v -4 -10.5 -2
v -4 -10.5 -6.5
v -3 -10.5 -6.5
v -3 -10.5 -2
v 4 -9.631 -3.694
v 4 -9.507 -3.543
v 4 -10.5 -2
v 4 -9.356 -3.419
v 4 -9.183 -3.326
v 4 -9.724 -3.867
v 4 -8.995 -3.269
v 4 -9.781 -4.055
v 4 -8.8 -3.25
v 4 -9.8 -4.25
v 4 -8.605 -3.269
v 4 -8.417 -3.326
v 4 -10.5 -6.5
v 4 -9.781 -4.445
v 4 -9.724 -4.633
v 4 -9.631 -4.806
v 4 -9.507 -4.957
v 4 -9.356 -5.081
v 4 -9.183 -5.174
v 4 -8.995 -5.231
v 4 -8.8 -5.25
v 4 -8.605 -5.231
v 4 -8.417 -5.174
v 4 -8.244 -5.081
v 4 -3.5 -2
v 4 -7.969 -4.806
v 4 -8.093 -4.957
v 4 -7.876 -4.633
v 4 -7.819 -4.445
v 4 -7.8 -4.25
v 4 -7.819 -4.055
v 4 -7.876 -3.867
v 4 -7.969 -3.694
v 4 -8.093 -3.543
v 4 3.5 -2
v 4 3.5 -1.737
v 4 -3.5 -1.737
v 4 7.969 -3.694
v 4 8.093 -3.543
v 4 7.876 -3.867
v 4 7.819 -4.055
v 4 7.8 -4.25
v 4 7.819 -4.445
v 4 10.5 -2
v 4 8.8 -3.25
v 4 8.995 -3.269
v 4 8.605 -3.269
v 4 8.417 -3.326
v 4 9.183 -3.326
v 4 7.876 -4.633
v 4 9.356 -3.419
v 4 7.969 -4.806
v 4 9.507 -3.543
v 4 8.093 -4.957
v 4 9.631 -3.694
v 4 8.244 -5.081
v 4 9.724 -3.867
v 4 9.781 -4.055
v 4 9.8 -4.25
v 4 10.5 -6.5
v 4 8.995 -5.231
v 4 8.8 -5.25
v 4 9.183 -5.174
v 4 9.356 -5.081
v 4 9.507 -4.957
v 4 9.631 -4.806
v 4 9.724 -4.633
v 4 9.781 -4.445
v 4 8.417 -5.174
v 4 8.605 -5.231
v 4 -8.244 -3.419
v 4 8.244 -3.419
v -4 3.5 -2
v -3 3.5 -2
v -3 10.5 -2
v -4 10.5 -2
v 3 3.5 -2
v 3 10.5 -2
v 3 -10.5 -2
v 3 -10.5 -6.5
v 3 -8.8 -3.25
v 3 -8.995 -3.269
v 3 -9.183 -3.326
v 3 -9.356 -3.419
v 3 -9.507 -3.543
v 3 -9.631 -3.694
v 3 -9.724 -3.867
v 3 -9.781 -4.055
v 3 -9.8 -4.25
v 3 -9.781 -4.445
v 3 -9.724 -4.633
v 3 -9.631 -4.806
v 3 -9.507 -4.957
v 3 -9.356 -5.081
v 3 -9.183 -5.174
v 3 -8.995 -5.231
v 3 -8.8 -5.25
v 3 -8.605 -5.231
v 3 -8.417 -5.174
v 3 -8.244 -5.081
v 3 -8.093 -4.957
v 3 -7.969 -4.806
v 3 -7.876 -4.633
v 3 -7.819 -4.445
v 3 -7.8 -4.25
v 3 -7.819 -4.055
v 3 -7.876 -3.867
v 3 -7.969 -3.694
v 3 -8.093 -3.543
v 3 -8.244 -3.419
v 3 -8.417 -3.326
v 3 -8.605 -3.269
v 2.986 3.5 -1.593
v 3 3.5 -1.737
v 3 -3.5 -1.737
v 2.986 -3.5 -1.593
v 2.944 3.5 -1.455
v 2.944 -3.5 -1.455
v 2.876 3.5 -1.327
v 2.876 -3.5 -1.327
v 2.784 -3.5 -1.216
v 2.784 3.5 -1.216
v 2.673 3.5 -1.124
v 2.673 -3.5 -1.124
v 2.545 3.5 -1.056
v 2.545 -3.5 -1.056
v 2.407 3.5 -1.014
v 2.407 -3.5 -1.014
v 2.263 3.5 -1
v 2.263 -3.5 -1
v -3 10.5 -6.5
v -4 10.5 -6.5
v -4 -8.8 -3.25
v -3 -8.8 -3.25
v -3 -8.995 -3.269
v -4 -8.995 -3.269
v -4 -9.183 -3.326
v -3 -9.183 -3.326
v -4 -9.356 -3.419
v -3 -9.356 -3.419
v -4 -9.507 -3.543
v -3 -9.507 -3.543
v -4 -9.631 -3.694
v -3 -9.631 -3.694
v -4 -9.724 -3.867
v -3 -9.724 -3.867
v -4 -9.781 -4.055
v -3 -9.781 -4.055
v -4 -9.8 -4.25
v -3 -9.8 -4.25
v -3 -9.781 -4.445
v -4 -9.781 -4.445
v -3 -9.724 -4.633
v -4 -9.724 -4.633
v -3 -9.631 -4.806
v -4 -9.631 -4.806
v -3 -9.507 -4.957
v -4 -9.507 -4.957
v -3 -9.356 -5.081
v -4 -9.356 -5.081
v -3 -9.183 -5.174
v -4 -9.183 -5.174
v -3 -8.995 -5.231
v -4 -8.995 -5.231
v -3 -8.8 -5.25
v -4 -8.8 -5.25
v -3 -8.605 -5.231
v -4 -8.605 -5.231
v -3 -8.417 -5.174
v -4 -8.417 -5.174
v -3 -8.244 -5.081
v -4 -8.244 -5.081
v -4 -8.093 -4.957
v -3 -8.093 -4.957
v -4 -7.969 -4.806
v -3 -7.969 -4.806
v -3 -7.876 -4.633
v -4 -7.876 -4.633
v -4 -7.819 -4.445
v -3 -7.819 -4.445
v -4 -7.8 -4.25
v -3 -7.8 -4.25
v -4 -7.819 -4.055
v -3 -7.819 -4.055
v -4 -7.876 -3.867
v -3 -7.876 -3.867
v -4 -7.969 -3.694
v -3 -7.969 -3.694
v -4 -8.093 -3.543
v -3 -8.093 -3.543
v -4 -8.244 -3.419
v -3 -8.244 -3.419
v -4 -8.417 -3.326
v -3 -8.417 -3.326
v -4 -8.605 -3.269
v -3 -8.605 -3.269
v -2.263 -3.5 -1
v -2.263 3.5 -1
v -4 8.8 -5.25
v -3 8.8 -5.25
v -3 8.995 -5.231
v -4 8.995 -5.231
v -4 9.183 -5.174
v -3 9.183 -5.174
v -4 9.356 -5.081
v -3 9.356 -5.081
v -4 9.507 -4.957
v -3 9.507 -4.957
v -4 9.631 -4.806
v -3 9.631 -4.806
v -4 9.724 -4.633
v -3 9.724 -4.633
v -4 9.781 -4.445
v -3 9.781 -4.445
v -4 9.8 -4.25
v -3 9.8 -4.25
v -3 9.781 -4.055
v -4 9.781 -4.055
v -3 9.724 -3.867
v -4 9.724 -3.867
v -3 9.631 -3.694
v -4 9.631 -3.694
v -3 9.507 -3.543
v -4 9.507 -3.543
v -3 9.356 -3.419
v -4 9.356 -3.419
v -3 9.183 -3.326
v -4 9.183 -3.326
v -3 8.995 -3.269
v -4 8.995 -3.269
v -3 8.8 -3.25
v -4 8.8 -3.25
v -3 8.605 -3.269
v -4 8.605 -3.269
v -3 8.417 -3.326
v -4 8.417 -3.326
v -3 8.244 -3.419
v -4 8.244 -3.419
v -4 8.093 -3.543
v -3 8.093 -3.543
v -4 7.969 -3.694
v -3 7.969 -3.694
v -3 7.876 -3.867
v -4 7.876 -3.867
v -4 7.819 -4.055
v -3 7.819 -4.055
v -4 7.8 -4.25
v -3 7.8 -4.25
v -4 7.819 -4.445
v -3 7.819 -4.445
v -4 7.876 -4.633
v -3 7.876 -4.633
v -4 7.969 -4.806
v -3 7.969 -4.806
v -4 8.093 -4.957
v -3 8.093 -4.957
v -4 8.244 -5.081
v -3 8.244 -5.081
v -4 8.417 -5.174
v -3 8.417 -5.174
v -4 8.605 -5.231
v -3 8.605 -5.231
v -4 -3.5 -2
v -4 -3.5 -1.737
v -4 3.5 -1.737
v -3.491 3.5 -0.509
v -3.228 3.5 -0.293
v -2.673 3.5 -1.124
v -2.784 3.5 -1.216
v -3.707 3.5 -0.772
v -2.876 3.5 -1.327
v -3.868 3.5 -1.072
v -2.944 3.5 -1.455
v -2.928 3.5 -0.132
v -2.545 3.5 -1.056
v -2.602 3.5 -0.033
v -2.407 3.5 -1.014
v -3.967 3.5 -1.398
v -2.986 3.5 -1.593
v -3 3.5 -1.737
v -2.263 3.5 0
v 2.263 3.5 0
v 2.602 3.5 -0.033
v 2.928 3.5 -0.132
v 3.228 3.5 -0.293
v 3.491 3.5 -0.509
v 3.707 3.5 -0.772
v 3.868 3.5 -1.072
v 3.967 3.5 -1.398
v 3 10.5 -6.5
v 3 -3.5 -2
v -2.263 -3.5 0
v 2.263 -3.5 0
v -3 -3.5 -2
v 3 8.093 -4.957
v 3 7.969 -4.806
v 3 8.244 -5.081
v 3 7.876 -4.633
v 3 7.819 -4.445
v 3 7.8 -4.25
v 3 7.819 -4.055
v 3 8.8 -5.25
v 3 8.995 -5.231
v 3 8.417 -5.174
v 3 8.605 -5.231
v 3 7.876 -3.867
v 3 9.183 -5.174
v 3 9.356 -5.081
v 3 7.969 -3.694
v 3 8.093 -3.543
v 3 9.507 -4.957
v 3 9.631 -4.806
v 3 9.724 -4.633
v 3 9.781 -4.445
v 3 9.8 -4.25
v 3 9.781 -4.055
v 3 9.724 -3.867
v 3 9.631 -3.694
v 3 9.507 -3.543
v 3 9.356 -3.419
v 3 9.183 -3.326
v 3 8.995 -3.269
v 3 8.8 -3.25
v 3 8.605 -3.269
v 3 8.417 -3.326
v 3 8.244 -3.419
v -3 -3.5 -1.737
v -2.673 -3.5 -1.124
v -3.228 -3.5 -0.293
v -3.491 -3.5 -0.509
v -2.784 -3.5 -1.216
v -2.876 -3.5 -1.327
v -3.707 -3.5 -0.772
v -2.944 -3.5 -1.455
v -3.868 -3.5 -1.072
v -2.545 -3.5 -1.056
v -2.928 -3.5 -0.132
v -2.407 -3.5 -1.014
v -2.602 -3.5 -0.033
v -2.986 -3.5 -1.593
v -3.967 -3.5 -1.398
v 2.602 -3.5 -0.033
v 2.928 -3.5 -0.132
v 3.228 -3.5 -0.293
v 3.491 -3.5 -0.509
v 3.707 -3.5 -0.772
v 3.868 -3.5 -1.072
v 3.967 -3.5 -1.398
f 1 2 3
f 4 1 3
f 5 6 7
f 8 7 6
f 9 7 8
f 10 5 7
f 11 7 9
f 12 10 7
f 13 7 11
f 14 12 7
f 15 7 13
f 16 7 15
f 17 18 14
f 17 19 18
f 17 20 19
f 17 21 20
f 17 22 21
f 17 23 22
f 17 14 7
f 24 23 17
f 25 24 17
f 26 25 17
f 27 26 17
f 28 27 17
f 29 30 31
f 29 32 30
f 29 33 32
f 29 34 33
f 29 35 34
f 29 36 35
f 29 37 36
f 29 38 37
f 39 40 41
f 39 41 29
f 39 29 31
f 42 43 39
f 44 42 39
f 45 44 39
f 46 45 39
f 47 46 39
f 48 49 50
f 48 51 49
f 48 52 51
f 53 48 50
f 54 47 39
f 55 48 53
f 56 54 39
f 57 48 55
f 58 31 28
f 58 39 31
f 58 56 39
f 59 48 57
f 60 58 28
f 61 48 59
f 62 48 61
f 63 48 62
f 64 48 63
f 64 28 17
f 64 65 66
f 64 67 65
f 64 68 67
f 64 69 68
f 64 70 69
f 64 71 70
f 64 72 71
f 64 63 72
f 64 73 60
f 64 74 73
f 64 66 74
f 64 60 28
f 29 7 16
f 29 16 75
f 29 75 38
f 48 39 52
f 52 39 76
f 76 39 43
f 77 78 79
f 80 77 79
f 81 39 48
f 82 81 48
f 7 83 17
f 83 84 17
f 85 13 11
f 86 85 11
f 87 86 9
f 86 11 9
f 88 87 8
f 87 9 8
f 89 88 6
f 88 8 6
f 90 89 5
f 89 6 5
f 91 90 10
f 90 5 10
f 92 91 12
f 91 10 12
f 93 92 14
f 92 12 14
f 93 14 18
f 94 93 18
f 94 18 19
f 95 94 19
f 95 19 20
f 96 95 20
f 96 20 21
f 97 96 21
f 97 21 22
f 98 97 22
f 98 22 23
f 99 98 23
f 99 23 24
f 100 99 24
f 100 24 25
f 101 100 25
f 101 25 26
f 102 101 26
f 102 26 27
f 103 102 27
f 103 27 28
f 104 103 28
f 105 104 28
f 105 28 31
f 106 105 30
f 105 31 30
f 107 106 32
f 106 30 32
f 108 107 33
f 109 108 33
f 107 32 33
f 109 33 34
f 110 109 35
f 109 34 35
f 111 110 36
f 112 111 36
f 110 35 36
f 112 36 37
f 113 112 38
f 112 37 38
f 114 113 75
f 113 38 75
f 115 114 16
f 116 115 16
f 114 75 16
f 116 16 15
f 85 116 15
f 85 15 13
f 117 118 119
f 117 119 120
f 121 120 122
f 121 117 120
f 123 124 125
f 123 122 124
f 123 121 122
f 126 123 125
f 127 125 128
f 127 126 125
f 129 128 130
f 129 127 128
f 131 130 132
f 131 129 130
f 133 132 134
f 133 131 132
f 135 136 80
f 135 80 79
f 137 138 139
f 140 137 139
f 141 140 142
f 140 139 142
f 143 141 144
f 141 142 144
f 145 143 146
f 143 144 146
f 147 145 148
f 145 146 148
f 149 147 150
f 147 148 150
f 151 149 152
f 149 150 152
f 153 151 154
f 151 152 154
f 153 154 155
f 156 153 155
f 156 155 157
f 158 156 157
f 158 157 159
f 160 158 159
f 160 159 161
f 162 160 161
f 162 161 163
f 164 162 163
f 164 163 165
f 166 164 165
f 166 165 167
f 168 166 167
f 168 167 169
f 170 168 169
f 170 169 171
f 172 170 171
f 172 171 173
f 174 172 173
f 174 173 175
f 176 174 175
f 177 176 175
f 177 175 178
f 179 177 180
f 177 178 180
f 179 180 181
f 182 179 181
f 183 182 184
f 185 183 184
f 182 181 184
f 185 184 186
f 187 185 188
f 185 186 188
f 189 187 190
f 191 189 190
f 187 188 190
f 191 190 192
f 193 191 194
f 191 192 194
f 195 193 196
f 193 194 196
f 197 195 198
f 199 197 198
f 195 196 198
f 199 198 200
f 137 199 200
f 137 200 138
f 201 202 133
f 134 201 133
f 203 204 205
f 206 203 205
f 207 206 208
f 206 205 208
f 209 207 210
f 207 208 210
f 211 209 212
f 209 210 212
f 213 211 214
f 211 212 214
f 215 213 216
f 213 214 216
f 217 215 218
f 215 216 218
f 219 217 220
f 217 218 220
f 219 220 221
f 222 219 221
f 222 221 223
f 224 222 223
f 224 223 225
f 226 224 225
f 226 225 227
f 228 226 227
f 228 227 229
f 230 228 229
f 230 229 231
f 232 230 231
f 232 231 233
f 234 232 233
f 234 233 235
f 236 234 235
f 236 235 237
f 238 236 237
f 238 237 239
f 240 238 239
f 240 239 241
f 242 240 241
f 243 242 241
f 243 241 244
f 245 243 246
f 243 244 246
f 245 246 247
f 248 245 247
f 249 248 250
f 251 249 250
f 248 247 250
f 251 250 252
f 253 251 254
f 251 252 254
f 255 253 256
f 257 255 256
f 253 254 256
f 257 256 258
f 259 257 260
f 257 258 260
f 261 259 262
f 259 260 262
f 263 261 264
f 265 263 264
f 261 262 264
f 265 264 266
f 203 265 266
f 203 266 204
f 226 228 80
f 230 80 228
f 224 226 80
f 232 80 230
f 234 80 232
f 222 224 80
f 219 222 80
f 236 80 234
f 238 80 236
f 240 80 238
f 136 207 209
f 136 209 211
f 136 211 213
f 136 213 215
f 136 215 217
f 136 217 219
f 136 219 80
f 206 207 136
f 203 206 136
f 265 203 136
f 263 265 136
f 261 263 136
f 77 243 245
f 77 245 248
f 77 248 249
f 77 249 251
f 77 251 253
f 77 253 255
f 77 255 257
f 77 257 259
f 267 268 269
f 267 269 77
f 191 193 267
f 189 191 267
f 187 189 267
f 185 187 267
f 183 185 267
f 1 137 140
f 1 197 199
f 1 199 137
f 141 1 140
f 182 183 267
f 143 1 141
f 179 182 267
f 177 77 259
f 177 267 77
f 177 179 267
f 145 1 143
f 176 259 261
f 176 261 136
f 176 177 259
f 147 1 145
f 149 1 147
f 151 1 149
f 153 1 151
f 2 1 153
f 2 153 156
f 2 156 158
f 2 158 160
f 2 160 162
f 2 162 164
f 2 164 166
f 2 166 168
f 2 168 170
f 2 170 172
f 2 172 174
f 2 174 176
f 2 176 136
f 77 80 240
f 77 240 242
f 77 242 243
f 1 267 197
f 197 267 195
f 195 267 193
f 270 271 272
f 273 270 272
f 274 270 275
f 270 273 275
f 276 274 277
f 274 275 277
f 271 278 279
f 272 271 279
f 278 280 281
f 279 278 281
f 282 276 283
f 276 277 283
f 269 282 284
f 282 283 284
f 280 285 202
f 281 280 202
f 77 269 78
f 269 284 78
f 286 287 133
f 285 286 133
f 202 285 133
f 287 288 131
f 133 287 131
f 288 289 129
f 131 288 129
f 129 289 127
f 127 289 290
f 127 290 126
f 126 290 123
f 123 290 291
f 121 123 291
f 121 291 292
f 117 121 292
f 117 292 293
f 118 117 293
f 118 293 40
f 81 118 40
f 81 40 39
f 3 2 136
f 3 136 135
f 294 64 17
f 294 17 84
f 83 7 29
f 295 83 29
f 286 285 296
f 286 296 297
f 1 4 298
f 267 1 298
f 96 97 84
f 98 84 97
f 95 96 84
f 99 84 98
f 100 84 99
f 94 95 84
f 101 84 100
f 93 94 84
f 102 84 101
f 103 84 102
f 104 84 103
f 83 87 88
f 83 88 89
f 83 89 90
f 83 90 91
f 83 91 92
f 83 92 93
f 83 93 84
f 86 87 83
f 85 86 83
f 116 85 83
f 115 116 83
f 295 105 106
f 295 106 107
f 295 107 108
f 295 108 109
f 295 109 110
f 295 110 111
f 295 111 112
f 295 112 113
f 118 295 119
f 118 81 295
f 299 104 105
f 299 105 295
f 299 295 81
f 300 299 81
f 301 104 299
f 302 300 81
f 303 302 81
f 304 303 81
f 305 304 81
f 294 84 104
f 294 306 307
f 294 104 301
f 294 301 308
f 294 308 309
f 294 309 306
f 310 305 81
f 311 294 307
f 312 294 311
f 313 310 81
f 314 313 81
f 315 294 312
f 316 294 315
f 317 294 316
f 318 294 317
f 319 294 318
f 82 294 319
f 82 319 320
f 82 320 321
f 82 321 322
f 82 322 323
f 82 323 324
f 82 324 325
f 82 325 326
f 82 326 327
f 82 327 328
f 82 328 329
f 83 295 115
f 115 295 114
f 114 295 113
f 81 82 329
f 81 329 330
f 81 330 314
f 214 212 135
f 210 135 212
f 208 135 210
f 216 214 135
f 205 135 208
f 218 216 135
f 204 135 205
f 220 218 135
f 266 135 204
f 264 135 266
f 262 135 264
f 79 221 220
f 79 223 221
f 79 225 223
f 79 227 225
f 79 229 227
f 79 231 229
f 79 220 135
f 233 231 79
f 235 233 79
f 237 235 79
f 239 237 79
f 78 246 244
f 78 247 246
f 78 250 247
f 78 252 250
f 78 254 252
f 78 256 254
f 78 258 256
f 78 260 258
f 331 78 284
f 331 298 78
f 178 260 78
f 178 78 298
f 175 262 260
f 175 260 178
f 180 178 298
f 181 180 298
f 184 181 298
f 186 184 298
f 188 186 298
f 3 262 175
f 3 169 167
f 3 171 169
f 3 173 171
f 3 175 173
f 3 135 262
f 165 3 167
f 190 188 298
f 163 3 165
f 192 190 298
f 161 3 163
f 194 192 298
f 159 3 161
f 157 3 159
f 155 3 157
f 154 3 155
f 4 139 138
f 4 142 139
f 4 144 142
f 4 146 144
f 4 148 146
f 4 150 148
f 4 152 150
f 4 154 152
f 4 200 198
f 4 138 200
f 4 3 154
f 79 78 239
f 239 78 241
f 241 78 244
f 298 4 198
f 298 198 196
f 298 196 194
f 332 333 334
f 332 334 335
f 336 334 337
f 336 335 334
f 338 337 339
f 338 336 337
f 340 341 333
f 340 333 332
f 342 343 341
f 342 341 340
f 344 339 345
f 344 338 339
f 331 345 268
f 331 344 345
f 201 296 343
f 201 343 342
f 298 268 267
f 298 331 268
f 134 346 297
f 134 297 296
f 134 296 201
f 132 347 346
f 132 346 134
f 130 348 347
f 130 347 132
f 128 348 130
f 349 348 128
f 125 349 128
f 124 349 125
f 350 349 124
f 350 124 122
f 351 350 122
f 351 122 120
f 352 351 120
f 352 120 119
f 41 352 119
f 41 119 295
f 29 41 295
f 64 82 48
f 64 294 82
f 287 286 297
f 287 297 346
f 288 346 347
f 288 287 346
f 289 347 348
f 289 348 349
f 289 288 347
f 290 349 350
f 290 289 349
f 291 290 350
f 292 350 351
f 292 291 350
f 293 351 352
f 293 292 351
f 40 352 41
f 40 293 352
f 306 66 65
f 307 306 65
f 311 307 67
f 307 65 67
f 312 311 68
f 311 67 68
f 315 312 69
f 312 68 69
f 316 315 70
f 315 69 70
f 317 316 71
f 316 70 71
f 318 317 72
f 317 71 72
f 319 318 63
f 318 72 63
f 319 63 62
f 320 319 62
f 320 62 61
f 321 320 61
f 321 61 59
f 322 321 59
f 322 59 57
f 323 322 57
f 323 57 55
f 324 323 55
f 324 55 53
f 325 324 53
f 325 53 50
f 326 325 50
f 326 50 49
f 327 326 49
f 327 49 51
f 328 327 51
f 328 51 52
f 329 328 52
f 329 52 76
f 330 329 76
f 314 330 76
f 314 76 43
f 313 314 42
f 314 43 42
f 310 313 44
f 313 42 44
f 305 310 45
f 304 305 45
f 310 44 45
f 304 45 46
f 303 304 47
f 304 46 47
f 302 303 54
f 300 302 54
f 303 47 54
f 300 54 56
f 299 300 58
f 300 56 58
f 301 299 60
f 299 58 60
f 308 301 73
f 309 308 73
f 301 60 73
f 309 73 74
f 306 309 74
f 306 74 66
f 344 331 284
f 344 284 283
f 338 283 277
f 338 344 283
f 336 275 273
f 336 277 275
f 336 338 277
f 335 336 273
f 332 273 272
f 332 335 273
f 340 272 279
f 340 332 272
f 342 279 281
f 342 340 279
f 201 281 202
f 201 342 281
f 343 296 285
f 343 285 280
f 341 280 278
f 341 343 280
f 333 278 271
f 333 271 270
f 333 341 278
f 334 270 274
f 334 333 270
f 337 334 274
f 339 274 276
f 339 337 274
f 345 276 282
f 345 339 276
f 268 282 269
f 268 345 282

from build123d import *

# Parameters (mm, degrees)
CROQUIS1_W                         = 8
CROQUIS1_H                         = 21
BRIDA_BASE1_DEPTH                  = 1
BRIDA_DE_ARISTA1_STRIP_W           = 5.4732
BRIDA_DE_ARISTA1_STRIP_H           = 1
BRIDA_DE_ARISTA1_STRIP_CUT_DEPTH   = 21
BRIDA_DE_ARISTA1_STRIP_2_W         = 5.4732
BRIDA_DE_ARISTA1_STRIP_2_H         = 1
BRIDA_DE_ARISTA1_STRIP_CUT_2_DEPTH = 21
BRIDA_DE_ARISTA1_DEPTH             = 21
BRIDA_DE_ARISTA1_BEND_DEPTH        = 21
CROQUIS34_W                        = 2
CROQUIS34_H                        = 7
CORTAR_EXTRUIR1_DEPTH              = 10
CORTAR_EXTRUIR2_REACH              = 16.714
CROQUIS35_R                        = 1


# Sheet-metal steps are written as plain solids
with BuildPart() as part:
    # Croquis1 → Brida base1 (new body)
    with BuildSketch(Plane.XY):
        Rectangle(CROQUIS1_W, CROQUIS1_H)
    extrude(amount=-BRIDA_BASE1_DEPTH)

    # Brida de arista1 strip (across the edge) → Brida de arista1 strip cut (cut)
    with BuildSketch(Plane(origin=(-4, -10.5, -1), x_dir=(1, 0, 0), z_dir=(0, 1, 0))):
        with Locations((-1, -0.5)):
            Rectangle(BRIDA_DE_ARISTA1_STRIP_W, BRIDA_DE_ARISTA1_STRIP_H)
    extrude(amount=BRIDA_DE_ARISTA1_STRIP_CUT_DEPTH, mode=Mode.SUBTRACT)

    # Brida de arista1 strip 2 (across the edge) → Brida de arista1 strip cut 2 (cut)
    with BuildSketch(Plane(origin=(4, 10.5, -1), x_dir=(-1, 0, 0), z_dir=(0, -1, 0))):
        with Locations((-1, -0.5)):
            Rectangle(BRIDA_DE_ARISTA1_STRIP_2_W, BRIDA_DE_ARISTA1_STRIP_2_H)
    extrude(amount=BRIDA_DE_ARISTA1_STRIP_CUT_2_DEPTH, mode=Mode.SUBTRACT)

    # Brida de arista1 section (across the edge) → Brida de arista1 (add)
    with BuildSketch(Plane(origin=(-4, -10.5, -1), x_dir=(1, 0, 0), z_dir=(0, 1, 0))):
        with BuildLine():
            Line((0, 0.7366), (0, 5.5))
            Line((0, 5.5), (1, 5.5))
            Line((1, 5.5), (1, 0.7366))
            ThreePointArc((1, 0.7366), (1.215745145, 0.215745145), (1.7366, 0))
            Line((1.7366, 0), (1.7366, -1))
            ThreePointArc((1.7366, -1), (0.508638364, -0.491361636), (0, 0.7366))
        make_face()
    extrude(amount=BRIDA_DE_ARISTA1_DEPTH)

    # Brida de arista1 section 2 (across the edge) → Brida de arista1 bend (add)
    with BuildSketch(Plane(origin=(4, 10.5, -1), x_dir=(-1, 0, 0), z_dir=(0, -1, 0))):
        with BuildLine():
            Line((0, 0.7366), (0, 5.5))
            Line((0, 5.5), (1, 5.5))
            Line((1, 5.5), (1, 0.7366))
            ThreePointArc((1, 0.7366), (1.215745145, 0.215745145), (1.7366, 0))
            Line((1.7366, 0), (1.7366, -1))
            ThreePointArc((1.7366, -1), (0.508638364, -0.491361636), (0, 0.7366))
        make_face()
    extrude(amount=BRIDA_DE_ARISTA1_BEND_DEPTH)

    # Croquis34 → Cortar-Extruir1 (cut)
    with BuildSketch(Plane(origin=(4, 0, 0), x_dir=(0, 0, -1), z_dir=(1, 0, 0))):
        with Locations((1, 7)):
            Rectangle(CROQUIS34_W, CROQUIS34_H)
        with Locations((1, -7)):
            Rectangle(CROQUIS34_W, CROQUIS34_H)
    extrude(amount=-CORTAR_EXTRUIR1_DEPTH, mode=Mode.SUBTRACT)

    # Cortar-Extruir2: up to this face of the body (flat: up to its plane)
    cortar_extruir2_end = Plane(part.part.faces().sort_by_distance((-4, 0, -4.204419709))[0])
    # Croquis35 → Cortar-Extruir2 (cut, up to the picked face)
    with BuildSketch(Plane(origin=(4, 0, 0), x_dir=(0, 0, -1), z_dir=(1, 0, 0)), mode=Mode.PRIVATE) as cortar_extruir2_sk1:
        with Locations((4.25, 8.8)):
            Circle(CROQUIS35_R)
    cortar_extruir2_tool1 = split(extrude(cortar_extruir2_sk1.sketch, amount=-CORTAR_EXTRUIR2_REACH, mode=Mode.PRIVATE), bisect_by=cortar_extruir2_end, keep=Keep.BOTH, mode=Mode.PRIVATE)
    # Croquis35 → Cortar-Extruir2 (cut, up to the picked face)
    with BuildSketch(Plane(origin=(4, 0, 0), x_dir=(0, 0, -1), z_dir=(1, 0, 0)), mode=Mode.PRIVATE) as cortar_extruir2_sk2:
        with Locations(Location((4.25, -8.8, 0), (0, 0, 180))):
            Circle(CROQUIS35_R)
    cortar_extruir2_tool2 = split(extrude(cortar_extruir2_sk2.sketch, amount=-CORTAR_EXTRUIR2_REACH, mode=Mode.PRIVATE), bisect_by=cortar_extruir2_end, keep=Keep.BOTH, mode=Mode.PRIVATE)
    add(cortar_extruir2_tool1.solids().sort_by(Axis((4, 8.8, -4.25), (-1, 0, 0)))[0], mode=Mode.SUBTRACT)
    add(cortar_extruir2_tool2.solids().sort_by(Axis((4, -8.8, -4.25), (-1, 0, 0)))[0], mode=Mode.SUBTRACT)


solid = part.part
